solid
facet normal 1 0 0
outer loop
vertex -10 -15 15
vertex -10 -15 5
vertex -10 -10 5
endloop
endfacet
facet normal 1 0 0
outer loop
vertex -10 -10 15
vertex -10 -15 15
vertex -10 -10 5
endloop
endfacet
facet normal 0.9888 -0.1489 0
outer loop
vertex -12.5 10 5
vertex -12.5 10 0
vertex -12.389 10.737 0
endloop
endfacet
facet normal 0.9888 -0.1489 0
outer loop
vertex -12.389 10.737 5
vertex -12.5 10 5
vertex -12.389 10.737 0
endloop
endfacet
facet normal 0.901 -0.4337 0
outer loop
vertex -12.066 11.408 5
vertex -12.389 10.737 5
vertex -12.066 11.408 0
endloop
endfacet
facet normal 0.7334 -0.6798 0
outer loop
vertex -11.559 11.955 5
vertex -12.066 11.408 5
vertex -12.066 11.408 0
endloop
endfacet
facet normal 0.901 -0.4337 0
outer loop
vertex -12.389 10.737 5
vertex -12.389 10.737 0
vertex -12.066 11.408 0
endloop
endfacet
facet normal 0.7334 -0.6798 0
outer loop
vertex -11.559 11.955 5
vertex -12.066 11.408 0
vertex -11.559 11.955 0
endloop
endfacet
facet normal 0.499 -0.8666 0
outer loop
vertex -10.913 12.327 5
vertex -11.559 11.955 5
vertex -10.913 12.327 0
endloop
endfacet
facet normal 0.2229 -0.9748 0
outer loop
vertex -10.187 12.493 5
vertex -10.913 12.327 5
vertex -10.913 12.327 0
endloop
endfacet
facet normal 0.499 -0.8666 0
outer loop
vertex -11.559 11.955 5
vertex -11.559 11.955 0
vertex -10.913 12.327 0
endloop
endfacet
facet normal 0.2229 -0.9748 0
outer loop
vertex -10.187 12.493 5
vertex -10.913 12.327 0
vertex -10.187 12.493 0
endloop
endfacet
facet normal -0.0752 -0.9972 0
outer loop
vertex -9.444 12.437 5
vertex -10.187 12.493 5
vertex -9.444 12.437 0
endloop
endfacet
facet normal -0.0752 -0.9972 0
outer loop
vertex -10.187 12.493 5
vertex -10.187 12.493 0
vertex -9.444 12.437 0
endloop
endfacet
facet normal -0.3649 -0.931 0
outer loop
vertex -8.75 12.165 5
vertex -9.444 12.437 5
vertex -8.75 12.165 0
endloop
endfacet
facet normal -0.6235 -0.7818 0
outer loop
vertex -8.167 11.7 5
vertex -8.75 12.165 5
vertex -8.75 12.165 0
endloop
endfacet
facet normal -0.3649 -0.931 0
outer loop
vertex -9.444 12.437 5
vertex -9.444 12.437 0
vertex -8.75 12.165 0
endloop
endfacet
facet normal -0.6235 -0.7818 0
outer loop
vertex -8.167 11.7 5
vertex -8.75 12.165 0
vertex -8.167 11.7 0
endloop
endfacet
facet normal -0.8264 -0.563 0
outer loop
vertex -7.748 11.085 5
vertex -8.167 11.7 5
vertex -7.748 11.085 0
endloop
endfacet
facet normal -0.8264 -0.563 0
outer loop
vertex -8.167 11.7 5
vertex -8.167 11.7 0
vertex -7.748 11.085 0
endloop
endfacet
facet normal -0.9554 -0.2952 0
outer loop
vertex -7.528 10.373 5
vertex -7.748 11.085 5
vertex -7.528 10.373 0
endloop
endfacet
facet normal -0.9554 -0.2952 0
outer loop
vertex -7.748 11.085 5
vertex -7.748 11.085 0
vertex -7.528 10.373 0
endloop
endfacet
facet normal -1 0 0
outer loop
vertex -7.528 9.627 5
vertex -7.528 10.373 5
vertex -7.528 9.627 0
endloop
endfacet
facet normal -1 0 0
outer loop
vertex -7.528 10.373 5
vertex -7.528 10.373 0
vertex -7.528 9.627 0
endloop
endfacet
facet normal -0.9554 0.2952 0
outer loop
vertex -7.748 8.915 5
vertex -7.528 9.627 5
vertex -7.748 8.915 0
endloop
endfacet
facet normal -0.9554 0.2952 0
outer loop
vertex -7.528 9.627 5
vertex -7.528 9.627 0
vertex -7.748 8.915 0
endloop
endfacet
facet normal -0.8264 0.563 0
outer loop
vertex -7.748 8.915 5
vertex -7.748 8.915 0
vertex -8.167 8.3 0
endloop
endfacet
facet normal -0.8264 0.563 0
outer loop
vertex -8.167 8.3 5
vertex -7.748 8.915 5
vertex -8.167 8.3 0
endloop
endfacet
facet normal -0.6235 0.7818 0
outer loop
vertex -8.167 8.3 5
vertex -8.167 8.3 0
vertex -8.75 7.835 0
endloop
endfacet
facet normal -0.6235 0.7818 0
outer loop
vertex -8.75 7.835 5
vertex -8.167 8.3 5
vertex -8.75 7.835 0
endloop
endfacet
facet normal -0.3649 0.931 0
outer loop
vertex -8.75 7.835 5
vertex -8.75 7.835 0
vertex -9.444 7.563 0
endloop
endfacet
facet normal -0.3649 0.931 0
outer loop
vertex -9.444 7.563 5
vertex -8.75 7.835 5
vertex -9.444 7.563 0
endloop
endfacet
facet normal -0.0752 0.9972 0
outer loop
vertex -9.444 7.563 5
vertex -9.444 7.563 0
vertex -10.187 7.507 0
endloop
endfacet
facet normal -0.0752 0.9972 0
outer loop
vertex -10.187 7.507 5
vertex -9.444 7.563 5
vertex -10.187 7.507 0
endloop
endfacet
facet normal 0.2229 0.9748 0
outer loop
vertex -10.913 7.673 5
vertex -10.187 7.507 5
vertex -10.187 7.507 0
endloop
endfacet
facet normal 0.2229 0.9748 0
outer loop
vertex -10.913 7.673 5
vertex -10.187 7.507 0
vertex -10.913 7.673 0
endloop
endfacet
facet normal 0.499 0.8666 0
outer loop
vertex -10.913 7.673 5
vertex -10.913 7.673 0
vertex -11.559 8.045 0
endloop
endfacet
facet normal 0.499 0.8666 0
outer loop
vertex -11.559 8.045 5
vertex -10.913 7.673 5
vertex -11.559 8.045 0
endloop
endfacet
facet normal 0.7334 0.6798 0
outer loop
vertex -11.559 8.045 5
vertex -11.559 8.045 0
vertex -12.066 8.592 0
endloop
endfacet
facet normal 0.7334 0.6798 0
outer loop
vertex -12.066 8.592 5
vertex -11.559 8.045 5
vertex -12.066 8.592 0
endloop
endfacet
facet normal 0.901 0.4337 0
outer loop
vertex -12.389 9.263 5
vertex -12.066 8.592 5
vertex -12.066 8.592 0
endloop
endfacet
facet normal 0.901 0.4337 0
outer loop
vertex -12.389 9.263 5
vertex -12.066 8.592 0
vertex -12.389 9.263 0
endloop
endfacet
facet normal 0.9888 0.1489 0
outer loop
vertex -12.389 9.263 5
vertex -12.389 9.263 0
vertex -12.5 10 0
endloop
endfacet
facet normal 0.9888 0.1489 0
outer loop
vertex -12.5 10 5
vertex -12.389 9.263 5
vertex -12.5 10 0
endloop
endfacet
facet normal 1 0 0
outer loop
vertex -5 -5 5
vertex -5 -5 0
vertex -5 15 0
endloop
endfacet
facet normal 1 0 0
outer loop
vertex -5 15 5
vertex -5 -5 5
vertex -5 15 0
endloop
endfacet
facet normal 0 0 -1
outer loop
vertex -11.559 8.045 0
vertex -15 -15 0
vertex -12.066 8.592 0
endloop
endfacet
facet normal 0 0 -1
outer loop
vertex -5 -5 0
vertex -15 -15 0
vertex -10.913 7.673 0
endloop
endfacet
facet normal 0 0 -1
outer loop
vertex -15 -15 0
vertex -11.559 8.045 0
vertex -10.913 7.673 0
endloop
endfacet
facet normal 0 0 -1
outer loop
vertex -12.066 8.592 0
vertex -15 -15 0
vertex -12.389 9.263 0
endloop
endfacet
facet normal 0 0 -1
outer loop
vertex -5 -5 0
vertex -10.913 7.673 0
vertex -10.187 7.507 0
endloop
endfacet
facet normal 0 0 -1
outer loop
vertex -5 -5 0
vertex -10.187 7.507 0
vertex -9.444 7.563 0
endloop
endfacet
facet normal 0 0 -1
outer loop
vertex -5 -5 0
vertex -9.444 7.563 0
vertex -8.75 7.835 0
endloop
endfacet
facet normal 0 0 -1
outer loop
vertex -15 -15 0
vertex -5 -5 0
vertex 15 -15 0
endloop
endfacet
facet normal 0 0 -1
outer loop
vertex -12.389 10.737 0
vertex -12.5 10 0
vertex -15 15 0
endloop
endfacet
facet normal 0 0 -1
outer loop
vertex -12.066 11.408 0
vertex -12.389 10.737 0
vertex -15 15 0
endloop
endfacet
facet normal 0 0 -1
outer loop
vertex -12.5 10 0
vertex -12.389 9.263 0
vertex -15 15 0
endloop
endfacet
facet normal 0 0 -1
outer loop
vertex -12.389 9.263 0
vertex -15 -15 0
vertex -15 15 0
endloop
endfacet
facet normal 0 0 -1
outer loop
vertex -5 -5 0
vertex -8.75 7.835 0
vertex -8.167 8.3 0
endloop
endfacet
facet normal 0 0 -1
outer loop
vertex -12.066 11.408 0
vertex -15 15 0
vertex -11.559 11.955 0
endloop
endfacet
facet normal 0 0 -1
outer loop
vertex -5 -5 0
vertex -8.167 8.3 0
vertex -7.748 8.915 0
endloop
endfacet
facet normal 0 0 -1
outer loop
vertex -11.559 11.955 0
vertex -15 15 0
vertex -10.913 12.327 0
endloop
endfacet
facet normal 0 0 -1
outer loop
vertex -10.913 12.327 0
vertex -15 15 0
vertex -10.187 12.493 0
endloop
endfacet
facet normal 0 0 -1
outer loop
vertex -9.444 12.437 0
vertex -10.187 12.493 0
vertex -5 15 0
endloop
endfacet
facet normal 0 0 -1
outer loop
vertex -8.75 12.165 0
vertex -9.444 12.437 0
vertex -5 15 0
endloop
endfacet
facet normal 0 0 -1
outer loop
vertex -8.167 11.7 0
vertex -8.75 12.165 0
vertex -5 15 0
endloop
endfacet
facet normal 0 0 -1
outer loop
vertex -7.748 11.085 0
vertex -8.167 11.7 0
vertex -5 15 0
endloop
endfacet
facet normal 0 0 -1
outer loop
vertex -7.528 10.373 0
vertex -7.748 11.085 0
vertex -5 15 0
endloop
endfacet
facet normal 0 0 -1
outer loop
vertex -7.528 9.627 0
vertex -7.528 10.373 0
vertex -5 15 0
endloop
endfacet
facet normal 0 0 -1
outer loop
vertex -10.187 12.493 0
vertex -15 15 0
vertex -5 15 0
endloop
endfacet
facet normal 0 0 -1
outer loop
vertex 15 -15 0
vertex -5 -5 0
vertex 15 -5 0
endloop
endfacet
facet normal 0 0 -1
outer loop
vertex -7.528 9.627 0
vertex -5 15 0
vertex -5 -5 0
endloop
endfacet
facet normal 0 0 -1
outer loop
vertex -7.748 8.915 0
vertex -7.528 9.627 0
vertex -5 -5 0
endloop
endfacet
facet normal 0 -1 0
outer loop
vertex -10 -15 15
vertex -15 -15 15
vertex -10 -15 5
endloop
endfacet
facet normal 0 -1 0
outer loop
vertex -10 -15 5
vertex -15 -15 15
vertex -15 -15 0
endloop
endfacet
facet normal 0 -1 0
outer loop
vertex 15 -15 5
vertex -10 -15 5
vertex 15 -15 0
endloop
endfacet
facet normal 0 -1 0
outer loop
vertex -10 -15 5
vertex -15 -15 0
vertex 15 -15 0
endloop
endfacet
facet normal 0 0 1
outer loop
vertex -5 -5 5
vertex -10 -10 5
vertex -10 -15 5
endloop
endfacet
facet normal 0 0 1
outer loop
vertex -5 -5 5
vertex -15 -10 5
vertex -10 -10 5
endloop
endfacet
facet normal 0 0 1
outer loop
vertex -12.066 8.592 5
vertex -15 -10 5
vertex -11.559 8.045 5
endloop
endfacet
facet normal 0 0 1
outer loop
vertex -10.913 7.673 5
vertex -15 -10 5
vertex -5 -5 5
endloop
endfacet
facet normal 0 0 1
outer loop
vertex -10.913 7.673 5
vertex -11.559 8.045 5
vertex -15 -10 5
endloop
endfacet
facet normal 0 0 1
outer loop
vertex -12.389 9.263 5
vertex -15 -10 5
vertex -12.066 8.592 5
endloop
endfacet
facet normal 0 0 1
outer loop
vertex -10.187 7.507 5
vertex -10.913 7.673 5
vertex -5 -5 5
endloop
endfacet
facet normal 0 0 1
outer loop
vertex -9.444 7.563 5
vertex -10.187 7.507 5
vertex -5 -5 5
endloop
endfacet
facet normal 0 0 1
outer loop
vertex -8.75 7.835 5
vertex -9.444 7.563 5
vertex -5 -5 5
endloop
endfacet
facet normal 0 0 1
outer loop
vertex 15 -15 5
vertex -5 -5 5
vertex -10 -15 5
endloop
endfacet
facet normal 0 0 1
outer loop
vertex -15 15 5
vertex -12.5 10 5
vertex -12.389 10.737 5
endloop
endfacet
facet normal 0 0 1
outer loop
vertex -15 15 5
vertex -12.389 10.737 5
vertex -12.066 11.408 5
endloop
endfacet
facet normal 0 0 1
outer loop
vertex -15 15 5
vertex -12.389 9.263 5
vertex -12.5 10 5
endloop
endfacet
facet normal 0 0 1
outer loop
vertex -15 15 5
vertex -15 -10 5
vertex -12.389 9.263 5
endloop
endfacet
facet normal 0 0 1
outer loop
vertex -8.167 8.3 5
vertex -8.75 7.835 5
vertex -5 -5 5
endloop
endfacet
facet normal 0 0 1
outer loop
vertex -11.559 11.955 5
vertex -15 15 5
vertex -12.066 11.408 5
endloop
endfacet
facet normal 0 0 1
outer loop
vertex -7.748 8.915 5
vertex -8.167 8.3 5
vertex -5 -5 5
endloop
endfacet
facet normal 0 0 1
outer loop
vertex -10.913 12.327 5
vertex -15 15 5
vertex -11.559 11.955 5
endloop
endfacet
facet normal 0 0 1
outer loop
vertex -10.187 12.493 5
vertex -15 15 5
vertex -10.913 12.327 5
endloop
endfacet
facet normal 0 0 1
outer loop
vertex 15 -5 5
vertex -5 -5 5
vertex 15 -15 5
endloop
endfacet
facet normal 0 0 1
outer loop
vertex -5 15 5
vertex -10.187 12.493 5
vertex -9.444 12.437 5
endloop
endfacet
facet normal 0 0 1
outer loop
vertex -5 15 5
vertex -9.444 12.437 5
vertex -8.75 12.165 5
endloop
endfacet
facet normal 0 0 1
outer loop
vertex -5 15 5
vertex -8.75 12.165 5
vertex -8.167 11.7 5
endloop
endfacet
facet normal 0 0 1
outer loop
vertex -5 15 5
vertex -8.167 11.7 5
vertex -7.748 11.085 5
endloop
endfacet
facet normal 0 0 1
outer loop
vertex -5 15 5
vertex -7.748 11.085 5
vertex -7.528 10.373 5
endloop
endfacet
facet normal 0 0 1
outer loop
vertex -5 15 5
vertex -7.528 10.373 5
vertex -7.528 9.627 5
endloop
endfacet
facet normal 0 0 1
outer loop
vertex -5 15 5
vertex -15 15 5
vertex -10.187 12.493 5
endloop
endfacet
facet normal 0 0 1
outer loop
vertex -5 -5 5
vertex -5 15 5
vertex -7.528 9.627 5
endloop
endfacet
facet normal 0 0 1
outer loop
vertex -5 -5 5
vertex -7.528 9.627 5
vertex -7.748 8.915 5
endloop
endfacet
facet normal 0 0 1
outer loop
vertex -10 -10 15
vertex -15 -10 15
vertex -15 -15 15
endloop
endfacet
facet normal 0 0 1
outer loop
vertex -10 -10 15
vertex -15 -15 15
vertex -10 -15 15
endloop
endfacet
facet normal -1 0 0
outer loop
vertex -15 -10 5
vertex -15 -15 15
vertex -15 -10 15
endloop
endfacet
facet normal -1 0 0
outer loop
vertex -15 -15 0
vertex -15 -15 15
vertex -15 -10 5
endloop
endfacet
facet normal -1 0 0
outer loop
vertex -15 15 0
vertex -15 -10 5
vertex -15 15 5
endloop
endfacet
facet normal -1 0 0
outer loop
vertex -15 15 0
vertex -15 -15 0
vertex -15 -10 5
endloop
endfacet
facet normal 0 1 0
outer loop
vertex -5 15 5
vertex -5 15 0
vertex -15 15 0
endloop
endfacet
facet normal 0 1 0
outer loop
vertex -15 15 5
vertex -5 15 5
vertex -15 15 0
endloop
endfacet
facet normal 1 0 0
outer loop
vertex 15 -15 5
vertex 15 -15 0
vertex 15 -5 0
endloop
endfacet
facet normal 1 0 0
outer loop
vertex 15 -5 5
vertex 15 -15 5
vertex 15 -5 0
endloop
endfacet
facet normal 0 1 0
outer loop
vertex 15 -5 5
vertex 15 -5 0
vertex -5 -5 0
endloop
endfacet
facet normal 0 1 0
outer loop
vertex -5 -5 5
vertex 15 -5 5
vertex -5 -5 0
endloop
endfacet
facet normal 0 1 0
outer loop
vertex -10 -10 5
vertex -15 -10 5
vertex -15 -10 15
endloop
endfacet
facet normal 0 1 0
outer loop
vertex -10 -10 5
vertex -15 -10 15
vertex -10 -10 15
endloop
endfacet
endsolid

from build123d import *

# Parameters (mm, degrees)
F1_DEPTH = 5
F2_W     = 5
F2_H     = 5
F3_DEPTH = 10
F5_D     = 5


with BuildPart() as f1:
    # F0 (on Top) → F1 (new body)
    with BuildSketch(Plane.XY):
        Polygon((-15, -15), (15, -15), (15, -5), (-5, -5), (-5, 15), (-15, 15), align=None)
    extrude(amount=F1_DEPTH)

    # F2 (on face) → F3 (join)
    with BuildSketch(Plane.XY.offset(5)):
        with Locations((-12.5, -12.5)):
            Rectangle(F2_W, F2_H)
    extrude(amount=F3_DEPTH)

    # F5 (through all)
    with Locations(Plane.XY.offset(5)):
        with Locations((-10, 10)):
            Hole(F5_D / 2)


solid = f1.part
